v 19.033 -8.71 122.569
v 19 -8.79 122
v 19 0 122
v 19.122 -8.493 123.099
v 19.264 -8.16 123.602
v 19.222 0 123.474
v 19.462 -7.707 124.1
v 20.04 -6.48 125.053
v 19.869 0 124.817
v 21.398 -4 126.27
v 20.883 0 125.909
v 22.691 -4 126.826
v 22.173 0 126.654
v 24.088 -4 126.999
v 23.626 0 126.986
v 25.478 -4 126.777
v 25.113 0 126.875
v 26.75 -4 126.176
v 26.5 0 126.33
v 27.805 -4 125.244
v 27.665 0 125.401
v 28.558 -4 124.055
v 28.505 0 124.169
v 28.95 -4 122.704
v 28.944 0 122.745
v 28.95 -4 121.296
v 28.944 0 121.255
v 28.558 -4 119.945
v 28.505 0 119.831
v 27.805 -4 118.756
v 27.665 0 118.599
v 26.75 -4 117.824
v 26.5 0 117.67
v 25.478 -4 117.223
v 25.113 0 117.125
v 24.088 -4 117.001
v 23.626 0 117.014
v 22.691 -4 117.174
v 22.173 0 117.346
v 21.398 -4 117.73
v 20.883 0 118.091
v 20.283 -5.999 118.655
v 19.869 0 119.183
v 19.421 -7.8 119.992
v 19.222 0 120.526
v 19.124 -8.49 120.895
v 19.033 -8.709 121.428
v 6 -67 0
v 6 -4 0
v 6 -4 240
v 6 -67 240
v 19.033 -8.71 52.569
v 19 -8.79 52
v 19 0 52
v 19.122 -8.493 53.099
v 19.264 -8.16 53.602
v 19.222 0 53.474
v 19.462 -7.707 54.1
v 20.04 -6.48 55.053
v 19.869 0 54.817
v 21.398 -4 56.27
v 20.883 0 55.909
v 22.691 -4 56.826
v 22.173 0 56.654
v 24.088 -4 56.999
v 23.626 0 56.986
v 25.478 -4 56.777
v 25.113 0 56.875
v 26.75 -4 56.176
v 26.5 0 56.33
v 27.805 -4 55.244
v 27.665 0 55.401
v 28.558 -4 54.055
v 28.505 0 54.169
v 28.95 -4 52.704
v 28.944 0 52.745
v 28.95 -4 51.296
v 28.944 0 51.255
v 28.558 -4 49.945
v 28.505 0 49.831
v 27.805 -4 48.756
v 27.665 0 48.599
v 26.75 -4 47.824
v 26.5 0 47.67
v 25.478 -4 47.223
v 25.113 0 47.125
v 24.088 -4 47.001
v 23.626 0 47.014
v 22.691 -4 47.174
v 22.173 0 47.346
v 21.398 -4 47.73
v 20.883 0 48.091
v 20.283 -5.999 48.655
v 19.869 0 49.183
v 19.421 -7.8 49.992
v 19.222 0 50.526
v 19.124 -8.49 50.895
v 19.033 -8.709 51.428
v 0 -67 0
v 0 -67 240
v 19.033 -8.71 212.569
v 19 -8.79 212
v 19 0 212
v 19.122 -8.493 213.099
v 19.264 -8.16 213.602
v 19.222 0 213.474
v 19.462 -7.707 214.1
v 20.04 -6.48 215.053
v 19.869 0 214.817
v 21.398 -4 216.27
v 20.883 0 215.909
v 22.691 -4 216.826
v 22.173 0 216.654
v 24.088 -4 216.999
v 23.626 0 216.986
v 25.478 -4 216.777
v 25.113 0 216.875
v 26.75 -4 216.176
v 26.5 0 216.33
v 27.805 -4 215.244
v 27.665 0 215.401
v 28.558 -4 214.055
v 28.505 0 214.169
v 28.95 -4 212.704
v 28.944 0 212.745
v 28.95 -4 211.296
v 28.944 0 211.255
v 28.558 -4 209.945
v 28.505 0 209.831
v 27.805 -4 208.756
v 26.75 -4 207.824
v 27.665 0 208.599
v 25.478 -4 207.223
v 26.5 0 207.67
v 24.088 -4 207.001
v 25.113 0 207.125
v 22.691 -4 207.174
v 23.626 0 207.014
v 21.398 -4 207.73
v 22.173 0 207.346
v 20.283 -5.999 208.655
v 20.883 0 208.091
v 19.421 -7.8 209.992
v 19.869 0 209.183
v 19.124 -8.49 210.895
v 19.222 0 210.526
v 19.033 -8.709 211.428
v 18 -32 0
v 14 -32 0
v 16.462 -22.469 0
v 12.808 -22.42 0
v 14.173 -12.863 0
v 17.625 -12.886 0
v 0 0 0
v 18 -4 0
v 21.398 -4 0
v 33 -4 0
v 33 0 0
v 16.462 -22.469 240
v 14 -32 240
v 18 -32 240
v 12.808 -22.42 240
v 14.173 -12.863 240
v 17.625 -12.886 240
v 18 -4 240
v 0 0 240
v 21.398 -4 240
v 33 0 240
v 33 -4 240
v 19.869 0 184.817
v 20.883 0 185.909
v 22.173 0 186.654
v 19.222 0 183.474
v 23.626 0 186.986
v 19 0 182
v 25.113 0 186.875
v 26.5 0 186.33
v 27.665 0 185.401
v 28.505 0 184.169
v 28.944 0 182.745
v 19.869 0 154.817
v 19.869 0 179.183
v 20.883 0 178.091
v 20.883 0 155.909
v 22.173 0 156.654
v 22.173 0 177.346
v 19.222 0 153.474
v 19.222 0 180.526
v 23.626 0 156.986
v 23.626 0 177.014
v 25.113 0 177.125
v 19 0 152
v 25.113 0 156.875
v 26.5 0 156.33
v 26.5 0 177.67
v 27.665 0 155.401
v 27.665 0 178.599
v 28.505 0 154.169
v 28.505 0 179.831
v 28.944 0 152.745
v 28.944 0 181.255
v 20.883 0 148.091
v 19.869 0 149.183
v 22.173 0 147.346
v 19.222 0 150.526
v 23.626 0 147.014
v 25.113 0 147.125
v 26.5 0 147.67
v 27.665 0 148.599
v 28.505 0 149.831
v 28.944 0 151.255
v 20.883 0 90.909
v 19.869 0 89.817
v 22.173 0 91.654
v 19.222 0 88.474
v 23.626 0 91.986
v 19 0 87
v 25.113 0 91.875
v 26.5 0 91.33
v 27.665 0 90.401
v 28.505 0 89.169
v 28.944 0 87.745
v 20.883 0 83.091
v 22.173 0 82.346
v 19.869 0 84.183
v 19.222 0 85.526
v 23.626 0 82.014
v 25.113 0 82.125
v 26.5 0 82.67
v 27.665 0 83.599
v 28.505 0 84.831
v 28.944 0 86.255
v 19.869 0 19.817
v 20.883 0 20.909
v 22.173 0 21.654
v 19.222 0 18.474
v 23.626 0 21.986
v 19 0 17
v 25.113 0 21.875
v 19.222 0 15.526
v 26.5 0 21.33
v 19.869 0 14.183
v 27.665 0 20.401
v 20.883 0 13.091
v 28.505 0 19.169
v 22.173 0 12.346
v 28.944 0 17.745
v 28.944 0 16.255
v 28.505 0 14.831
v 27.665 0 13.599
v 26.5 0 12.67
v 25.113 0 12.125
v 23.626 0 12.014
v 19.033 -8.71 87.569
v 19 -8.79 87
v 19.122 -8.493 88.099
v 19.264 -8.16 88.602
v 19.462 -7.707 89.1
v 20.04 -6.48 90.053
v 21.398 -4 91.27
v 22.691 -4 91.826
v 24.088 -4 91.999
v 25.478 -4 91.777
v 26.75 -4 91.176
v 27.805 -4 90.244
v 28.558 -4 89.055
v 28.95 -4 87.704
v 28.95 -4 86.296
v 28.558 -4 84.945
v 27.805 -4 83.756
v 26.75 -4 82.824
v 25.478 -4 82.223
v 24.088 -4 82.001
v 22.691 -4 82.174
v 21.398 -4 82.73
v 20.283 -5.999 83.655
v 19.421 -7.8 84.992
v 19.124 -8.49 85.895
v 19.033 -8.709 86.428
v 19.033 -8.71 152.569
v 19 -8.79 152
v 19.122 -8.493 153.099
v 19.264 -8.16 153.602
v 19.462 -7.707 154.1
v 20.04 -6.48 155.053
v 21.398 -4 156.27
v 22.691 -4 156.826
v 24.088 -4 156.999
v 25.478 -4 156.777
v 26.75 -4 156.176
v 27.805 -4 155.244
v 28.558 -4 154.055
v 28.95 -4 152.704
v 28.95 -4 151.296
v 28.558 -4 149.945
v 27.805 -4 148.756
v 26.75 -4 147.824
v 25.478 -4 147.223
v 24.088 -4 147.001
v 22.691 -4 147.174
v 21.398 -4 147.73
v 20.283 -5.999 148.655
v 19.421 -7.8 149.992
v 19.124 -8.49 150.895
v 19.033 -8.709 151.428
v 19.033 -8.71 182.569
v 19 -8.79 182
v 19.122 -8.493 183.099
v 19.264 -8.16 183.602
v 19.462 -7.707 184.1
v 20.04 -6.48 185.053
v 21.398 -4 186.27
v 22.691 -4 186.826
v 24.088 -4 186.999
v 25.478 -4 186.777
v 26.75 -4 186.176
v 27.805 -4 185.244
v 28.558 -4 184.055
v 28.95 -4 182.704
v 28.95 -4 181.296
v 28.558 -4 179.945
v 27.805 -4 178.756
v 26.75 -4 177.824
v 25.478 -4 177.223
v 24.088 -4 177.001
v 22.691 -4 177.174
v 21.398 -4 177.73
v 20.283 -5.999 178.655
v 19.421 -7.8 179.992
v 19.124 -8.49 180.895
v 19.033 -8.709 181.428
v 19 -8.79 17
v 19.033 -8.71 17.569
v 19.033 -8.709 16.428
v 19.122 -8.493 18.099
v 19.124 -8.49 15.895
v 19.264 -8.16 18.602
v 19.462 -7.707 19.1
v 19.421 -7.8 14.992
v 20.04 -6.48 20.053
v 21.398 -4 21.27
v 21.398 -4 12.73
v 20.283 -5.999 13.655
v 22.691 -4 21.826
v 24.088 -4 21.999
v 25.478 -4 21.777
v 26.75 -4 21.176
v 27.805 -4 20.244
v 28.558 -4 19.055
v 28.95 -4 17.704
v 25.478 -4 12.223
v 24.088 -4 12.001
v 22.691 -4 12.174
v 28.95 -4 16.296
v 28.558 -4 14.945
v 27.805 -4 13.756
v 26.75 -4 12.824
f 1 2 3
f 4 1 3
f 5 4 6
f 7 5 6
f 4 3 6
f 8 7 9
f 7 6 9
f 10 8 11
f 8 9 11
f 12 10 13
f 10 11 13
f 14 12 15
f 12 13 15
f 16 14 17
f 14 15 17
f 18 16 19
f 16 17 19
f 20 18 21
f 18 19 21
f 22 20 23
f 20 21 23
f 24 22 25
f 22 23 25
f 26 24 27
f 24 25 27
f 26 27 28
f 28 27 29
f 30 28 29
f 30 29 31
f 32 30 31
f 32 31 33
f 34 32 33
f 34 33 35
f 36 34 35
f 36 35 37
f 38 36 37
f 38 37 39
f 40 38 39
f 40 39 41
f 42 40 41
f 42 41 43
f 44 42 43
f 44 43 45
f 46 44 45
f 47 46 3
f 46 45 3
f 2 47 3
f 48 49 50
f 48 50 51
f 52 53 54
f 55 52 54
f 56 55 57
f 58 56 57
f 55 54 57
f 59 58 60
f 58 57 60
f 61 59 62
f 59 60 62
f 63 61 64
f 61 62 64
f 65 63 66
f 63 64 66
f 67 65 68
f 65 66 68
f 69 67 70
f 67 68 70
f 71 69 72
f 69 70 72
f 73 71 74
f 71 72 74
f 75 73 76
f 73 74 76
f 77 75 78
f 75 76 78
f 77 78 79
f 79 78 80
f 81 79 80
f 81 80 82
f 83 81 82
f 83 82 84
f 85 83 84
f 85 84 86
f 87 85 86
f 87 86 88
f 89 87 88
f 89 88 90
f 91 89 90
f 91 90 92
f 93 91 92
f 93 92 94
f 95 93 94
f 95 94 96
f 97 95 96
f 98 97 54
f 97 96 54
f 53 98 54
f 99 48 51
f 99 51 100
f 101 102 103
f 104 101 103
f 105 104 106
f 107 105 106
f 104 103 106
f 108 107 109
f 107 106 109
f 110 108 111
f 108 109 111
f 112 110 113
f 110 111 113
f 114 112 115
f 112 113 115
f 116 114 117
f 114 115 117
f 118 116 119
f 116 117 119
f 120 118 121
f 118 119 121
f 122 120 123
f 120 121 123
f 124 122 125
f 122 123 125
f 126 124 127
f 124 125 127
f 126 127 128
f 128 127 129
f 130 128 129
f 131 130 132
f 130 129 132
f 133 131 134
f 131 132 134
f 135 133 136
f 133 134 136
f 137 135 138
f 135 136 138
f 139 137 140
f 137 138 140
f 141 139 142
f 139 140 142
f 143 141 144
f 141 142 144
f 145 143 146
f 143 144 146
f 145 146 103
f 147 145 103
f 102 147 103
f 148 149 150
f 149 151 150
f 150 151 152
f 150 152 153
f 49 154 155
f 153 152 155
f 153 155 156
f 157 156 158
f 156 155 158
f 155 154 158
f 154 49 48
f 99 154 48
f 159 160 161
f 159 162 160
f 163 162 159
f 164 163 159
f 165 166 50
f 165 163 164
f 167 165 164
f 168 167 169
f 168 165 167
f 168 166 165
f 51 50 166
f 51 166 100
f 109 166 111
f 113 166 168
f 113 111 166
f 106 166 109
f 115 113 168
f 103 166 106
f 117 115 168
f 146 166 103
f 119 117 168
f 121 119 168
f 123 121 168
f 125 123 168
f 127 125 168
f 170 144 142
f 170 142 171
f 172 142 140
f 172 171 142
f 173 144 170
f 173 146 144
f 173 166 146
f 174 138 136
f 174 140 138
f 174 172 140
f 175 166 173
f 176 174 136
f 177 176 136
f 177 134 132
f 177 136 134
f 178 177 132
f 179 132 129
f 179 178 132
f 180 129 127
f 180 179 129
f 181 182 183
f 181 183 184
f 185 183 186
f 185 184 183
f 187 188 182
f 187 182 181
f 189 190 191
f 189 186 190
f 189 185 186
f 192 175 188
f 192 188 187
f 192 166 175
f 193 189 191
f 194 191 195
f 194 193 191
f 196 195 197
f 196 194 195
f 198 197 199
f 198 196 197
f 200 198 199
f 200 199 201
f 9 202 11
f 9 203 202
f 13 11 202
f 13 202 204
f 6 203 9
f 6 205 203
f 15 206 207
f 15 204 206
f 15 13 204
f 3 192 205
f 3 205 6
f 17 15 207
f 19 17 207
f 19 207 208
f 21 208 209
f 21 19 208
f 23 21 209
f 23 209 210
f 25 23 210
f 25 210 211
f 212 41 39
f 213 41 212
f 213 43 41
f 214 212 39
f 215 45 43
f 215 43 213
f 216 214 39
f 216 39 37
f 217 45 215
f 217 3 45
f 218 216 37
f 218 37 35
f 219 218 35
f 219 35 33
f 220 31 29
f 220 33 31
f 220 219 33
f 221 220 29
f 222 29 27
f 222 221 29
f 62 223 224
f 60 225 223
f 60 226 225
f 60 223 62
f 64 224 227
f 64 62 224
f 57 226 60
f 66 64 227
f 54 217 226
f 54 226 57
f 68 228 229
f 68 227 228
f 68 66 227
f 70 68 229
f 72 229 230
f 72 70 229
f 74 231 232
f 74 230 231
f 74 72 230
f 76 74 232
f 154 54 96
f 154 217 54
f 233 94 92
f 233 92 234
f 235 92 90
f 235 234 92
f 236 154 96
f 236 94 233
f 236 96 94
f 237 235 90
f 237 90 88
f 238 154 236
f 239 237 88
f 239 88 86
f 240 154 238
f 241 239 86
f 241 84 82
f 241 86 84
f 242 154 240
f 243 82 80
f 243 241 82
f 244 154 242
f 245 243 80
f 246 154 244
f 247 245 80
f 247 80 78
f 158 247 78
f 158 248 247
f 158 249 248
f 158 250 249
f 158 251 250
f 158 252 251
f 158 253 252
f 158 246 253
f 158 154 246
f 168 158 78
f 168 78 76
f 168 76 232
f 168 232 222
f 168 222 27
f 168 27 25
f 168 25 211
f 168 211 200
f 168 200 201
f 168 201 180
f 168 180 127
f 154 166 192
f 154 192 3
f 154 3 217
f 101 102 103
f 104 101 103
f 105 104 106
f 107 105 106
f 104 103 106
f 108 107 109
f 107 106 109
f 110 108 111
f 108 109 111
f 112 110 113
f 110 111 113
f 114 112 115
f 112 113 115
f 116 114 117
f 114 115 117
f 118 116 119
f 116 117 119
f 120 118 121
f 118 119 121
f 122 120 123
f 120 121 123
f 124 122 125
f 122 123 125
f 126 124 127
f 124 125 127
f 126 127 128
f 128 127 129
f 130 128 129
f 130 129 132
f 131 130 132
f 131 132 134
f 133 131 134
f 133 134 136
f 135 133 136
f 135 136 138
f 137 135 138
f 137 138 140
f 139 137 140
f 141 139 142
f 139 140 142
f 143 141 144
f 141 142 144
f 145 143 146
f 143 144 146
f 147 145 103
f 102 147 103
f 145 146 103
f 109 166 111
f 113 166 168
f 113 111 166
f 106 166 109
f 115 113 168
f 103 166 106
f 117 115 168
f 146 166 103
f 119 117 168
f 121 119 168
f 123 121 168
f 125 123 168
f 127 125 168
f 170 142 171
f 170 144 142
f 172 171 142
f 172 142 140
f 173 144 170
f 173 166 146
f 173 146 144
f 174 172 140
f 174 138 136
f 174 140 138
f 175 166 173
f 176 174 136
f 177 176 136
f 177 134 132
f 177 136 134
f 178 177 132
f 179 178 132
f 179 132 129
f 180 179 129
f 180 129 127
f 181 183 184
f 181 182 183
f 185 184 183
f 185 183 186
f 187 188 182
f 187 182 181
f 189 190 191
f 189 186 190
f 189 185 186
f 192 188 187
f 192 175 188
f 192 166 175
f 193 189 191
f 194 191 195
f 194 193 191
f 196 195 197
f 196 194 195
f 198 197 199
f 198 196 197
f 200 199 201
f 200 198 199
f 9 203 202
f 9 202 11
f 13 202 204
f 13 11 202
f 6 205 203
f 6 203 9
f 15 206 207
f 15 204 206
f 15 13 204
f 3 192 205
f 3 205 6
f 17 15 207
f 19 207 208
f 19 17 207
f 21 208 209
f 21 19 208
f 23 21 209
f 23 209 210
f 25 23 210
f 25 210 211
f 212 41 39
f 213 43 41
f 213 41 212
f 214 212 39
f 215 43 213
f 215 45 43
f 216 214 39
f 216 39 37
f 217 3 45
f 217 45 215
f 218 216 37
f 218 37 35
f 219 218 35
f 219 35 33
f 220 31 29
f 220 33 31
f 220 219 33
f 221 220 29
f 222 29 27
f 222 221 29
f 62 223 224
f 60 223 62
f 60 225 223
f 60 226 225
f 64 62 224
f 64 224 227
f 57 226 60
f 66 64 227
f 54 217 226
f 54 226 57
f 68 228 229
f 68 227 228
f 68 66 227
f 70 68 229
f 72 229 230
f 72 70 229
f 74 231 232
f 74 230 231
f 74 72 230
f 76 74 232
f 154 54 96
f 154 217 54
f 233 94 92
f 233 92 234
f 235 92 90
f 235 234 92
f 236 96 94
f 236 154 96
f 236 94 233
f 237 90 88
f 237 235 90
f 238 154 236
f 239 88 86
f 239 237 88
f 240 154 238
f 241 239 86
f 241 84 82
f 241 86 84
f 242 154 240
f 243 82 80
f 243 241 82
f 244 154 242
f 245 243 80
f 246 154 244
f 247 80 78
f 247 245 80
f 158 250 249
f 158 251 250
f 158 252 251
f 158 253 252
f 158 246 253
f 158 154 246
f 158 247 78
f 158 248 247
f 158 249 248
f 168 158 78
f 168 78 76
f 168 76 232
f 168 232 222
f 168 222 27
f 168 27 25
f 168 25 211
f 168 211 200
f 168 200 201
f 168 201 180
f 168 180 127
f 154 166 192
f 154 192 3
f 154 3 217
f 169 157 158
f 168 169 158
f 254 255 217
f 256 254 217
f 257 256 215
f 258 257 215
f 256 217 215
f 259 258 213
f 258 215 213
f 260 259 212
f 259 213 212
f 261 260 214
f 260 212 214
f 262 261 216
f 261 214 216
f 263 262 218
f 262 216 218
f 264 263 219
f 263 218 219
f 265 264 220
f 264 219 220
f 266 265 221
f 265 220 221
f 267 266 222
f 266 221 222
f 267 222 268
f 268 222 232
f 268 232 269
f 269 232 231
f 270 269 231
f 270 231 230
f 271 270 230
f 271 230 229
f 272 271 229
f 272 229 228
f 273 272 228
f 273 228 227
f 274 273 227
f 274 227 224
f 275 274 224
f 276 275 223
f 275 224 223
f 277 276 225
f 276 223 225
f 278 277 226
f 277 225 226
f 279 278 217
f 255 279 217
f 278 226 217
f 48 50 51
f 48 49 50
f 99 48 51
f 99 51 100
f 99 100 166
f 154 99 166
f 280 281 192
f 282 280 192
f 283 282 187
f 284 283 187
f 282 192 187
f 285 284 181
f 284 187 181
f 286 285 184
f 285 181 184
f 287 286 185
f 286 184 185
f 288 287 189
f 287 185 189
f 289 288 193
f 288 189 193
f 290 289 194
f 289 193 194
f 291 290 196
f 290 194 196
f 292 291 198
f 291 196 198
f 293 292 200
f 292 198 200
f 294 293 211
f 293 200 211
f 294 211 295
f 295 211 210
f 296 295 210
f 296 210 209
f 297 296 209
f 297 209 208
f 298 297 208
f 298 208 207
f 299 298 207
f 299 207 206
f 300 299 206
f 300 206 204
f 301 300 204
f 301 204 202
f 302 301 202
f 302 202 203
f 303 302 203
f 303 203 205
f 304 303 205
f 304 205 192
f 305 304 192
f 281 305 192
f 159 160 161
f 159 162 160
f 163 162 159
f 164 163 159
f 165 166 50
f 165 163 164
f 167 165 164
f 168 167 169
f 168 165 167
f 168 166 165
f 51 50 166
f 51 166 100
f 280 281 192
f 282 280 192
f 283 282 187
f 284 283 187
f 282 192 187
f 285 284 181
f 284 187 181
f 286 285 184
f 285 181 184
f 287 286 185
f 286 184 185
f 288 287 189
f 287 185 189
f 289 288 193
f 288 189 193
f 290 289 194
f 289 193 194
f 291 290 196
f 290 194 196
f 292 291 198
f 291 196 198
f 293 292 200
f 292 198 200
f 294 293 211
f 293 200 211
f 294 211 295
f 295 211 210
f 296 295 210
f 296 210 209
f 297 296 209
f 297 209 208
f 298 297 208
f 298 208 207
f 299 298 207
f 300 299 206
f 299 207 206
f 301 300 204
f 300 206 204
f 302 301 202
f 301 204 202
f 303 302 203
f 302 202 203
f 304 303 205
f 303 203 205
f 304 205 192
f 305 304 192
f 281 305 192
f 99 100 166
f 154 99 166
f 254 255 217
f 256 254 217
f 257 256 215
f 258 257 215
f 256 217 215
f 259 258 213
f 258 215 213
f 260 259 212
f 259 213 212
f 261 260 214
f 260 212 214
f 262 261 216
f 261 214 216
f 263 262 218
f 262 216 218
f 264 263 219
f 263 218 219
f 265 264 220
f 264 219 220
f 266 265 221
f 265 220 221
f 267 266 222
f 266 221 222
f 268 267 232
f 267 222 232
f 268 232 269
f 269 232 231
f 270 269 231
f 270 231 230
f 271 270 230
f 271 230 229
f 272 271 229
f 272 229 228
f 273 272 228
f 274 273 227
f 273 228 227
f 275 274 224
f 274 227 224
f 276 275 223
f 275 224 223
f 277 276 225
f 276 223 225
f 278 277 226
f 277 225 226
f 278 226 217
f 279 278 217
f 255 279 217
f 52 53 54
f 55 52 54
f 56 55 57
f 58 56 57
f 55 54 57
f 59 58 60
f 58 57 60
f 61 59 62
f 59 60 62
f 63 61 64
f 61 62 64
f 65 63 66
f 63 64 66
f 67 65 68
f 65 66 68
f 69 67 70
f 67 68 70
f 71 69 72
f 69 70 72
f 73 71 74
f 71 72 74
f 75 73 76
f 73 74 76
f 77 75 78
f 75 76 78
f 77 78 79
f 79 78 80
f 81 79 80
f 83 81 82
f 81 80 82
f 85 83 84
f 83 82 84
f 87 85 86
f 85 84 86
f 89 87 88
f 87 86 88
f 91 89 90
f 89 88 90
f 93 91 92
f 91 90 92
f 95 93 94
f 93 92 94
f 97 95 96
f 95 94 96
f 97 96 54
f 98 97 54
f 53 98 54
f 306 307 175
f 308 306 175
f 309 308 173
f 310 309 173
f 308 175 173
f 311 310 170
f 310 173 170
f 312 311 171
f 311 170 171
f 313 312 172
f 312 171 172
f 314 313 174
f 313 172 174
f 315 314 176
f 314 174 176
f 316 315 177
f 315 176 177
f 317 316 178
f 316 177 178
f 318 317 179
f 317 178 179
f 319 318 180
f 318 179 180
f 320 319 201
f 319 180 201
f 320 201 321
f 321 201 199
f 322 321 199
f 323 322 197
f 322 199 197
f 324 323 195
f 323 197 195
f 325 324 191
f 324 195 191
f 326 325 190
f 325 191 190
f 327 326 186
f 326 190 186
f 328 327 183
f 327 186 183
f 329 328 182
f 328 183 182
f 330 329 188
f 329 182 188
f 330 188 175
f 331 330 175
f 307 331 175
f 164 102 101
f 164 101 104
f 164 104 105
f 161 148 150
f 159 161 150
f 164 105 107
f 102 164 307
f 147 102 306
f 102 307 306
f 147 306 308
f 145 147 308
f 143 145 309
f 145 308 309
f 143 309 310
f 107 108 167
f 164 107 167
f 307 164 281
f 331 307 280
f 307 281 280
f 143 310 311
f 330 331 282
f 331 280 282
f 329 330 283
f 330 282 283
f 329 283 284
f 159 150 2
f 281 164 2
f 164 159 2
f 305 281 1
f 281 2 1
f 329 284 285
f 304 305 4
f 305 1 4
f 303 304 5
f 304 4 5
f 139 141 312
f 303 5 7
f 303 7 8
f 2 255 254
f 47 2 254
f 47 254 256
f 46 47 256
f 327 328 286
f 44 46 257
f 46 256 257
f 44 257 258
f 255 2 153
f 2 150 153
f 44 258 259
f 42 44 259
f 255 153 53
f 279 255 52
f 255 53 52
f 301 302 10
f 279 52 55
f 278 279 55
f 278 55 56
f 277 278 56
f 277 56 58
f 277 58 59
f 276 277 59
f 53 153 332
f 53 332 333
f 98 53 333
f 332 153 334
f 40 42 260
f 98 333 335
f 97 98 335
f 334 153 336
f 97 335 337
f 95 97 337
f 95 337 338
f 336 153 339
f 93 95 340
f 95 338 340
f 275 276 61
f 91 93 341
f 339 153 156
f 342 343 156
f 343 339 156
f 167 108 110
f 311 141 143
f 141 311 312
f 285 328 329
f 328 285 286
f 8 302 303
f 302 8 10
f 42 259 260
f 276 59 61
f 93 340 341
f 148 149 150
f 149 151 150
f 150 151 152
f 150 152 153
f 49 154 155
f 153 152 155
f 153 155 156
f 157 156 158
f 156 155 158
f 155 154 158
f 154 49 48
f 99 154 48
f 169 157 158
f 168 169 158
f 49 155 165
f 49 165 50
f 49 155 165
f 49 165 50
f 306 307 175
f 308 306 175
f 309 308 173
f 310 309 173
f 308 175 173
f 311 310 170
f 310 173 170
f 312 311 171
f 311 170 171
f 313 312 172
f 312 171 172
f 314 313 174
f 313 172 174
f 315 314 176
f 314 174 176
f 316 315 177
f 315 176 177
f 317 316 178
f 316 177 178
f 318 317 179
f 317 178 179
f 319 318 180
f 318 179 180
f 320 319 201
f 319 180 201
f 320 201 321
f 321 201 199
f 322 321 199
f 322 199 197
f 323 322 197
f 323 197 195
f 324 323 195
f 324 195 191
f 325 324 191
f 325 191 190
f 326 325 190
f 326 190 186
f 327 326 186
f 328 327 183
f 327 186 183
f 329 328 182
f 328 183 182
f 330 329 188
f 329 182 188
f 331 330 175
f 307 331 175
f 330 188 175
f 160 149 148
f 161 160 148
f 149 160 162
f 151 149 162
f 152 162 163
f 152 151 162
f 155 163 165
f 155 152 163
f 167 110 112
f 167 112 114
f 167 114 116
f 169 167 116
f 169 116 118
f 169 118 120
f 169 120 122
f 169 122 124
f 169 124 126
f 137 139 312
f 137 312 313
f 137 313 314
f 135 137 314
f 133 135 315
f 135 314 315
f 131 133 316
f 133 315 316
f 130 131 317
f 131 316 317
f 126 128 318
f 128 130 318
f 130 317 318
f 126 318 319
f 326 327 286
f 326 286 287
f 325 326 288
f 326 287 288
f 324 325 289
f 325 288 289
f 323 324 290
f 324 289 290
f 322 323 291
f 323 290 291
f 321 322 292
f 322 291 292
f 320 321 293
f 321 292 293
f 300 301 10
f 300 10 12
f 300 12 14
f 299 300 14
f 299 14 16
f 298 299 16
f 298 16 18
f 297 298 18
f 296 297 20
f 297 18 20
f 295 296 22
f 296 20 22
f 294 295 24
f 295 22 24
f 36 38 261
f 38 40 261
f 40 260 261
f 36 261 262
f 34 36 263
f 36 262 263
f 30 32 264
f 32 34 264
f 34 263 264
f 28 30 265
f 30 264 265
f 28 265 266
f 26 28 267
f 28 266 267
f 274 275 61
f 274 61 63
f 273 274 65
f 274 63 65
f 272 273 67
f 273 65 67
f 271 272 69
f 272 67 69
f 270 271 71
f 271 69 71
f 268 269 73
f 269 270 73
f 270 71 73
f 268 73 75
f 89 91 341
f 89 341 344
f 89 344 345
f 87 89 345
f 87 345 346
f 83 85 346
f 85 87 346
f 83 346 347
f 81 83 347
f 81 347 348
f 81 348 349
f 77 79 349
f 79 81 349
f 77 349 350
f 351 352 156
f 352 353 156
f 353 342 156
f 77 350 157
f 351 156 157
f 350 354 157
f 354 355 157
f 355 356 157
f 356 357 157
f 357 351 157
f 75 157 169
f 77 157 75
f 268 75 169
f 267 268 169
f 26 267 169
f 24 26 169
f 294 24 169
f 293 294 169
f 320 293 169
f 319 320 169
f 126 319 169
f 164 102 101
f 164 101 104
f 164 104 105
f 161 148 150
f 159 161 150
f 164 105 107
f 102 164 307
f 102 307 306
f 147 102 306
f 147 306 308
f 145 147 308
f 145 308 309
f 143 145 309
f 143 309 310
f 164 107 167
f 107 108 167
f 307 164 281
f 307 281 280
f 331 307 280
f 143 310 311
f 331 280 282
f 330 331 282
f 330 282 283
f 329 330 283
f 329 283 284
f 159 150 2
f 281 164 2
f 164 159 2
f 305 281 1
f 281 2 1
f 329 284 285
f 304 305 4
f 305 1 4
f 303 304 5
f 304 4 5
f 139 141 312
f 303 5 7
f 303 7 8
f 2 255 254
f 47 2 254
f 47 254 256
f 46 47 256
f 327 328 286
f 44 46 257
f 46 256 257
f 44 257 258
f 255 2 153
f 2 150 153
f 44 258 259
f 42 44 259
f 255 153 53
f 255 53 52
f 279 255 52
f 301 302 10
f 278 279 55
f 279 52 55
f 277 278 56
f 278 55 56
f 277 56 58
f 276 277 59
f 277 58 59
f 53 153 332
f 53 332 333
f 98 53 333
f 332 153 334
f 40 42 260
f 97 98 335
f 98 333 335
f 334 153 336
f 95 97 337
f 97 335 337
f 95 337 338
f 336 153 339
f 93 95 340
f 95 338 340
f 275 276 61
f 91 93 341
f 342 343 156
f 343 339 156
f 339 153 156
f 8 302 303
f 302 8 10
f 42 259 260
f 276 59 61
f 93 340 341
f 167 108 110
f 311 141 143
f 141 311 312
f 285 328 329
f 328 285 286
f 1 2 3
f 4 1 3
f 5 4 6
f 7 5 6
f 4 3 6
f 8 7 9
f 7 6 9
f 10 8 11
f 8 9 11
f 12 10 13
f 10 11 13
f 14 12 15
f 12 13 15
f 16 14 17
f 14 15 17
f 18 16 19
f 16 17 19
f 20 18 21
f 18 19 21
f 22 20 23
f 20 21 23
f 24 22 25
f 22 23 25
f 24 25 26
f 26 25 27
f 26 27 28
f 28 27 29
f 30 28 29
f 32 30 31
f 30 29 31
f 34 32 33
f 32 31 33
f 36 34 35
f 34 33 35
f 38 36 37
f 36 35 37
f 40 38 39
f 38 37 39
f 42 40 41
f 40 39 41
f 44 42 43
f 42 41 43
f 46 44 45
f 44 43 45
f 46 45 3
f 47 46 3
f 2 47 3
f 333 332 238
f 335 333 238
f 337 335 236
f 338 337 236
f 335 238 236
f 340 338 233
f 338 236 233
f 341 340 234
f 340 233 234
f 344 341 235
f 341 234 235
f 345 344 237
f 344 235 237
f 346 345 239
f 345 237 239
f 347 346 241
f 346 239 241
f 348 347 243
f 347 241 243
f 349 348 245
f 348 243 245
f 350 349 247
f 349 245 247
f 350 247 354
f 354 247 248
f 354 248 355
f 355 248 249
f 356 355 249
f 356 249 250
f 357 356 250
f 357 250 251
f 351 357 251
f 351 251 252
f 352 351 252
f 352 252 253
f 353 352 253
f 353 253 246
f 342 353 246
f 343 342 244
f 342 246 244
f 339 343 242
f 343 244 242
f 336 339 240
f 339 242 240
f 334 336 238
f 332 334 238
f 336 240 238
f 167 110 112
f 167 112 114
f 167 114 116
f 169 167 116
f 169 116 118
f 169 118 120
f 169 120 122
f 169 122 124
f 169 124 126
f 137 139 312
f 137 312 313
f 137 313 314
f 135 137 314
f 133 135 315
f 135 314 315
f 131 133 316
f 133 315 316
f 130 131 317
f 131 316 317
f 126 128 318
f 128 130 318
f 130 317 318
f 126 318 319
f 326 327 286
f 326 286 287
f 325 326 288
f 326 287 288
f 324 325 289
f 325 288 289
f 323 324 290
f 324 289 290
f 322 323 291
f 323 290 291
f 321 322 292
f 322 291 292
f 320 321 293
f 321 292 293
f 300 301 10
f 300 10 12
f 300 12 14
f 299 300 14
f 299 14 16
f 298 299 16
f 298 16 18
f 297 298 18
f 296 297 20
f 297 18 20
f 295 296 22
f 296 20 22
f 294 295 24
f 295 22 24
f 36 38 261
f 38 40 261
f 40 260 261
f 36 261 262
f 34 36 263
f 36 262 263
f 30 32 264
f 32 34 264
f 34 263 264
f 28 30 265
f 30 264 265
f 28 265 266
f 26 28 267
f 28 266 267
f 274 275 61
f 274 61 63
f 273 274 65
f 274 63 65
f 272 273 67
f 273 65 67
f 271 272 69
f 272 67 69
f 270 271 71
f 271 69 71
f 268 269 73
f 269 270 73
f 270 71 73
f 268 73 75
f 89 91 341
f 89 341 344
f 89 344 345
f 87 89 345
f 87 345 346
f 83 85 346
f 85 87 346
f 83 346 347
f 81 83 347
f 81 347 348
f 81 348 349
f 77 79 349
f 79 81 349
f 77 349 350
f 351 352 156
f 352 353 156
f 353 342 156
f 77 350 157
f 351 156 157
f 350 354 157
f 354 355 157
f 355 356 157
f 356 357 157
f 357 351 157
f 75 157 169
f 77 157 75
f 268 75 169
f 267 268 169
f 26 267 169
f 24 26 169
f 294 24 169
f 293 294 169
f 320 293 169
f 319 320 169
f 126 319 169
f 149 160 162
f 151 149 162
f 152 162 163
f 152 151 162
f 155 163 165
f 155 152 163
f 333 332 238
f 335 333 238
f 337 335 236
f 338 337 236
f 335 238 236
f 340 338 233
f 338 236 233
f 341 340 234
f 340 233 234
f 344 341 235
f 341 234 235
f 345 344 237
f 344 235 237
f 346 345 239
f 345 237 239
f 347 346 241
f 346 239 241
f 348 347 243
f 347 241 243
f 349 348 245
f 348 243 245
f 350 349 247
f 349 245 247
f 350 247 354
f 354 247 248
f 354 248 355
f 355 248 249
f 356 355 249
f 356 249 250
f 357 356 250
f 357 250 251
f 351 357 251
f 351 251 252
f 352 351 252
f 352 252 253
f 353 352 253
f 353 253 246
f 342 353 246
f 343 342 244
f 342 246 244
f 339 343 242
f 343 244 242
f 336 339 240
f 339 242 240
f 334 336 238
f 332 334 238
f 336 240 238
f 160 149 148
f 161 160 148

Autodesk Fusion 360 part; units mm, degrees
sketch "Sketch1" plane through (0, 0, 0) normal (0, 0, 1) x (1, 0, 0) in component "Component"
  line L0 (0, 0) -> (6, 0)
  line L1 (6, 0) -> (6, -67)
  line L2 (6, -67) -> (0, -67)
  line L3 (0, -67) -> (0, 0)
  line L4 (6, 0) -> (18, 0)
  line L5 (18, 0) -> (18, -4)
  line L6 (18, -4) -> (6, -4)
  line L7 (6, -4) -> (6, 0)
  line L8 (8.0693, -4) -> (8.0693, -32) construction
  arc A0 (18, -4) -> (14, -32) centre (49.25, -22.75) ccw
  arc A1 (21.3985, -4) -> (18, -32) centre (50.9488, -21.7929) ccw
  line L9 (18, -4) -> (21.3985, -4)
  line L10 (14, -32) -> (18, -32)
  dimension "d1" = 6
  dimension "d2" = 67
  dimension "d3" = 12
  dimension "d4" = 4
  dimension "d5" = 28
extrude "Extrude1" add sketch "Sketch1" along normal blind 240 makes body 1 at (0, -44.6667, 160) in component "Component"
sketch "Sketch2" plane through (0, 0, 0) normal (0, 1, 0) x (-1, 0, 0) in component "Component"
  line L0 (-18, 0) -> (0, 0)
  line L1 (0, 0) -> (0, 240)
  line L2 (0, 240) -> (-18, 240)
  line L3 (-18, 240) -> (-18, 0)
  circle A0 centre (-24, 17) radius 5
  line L4 (-9, 47) -> (-24, 52) construction
  circle A1 centre (-24, 52) radius 5
  circle A2 centre (-24, 87) radius 5
  circle A3 centre (-24, 122) radius 5
  circle A4 centre (-24, 152) radius 5
  circle A5 centre (-24, 182) radius 5
  circle A6 centre (-24, 212) radius 5
  dimension "d10" = 10
  dimension "d12" = 10
  dimension "d14" = 10
  dimension "d16" = 10
  dimension "d18" = 10
  dimension "d20" = 10
  dimension "d22" = 10
sketch "Sketch3" plane through (0, 0, 0) normal (0, 0, 1) x (1, 0, 0) in component "Component"
  line L0 (18, 0) -> (33, 0)
  line L1 (18, -4) -> (33, -4)
  line L2 (33, -4) -> (33, 0)
  line L3 (18, 0) -> (18, -4)
  dimension "d23" = 15
extrude "Extrude2" add sketch "Sketch3" along normal blind 240 bodies 1 in component "Component"
extrude "Extrude3" cut sketch "Sketch2" against normal blind 20 contours A0 | A1 | A2 | A3 | A4 | A5 | A6 bodies 1 in component "Component"
copy_body "CopyPasteBodies2" bodies 1 makes body 2 in component "Component"
sketch "Sketch1 (2)" plane through (0, 0, 0) normal (0, 0, 1) x (1, 0, 0)
  line L0 (30, 40) -> (0, 40)
  line L1 (0, 40) -> (0, 60)
  line L2 (0, 60) -> (30, 60)
  line L3 (30, 60) -> (30, 40)
component "Component" placed x (1, 0, 0) y (0, 1, 0) z (0, 0, 1) at (0, 0, 0)
